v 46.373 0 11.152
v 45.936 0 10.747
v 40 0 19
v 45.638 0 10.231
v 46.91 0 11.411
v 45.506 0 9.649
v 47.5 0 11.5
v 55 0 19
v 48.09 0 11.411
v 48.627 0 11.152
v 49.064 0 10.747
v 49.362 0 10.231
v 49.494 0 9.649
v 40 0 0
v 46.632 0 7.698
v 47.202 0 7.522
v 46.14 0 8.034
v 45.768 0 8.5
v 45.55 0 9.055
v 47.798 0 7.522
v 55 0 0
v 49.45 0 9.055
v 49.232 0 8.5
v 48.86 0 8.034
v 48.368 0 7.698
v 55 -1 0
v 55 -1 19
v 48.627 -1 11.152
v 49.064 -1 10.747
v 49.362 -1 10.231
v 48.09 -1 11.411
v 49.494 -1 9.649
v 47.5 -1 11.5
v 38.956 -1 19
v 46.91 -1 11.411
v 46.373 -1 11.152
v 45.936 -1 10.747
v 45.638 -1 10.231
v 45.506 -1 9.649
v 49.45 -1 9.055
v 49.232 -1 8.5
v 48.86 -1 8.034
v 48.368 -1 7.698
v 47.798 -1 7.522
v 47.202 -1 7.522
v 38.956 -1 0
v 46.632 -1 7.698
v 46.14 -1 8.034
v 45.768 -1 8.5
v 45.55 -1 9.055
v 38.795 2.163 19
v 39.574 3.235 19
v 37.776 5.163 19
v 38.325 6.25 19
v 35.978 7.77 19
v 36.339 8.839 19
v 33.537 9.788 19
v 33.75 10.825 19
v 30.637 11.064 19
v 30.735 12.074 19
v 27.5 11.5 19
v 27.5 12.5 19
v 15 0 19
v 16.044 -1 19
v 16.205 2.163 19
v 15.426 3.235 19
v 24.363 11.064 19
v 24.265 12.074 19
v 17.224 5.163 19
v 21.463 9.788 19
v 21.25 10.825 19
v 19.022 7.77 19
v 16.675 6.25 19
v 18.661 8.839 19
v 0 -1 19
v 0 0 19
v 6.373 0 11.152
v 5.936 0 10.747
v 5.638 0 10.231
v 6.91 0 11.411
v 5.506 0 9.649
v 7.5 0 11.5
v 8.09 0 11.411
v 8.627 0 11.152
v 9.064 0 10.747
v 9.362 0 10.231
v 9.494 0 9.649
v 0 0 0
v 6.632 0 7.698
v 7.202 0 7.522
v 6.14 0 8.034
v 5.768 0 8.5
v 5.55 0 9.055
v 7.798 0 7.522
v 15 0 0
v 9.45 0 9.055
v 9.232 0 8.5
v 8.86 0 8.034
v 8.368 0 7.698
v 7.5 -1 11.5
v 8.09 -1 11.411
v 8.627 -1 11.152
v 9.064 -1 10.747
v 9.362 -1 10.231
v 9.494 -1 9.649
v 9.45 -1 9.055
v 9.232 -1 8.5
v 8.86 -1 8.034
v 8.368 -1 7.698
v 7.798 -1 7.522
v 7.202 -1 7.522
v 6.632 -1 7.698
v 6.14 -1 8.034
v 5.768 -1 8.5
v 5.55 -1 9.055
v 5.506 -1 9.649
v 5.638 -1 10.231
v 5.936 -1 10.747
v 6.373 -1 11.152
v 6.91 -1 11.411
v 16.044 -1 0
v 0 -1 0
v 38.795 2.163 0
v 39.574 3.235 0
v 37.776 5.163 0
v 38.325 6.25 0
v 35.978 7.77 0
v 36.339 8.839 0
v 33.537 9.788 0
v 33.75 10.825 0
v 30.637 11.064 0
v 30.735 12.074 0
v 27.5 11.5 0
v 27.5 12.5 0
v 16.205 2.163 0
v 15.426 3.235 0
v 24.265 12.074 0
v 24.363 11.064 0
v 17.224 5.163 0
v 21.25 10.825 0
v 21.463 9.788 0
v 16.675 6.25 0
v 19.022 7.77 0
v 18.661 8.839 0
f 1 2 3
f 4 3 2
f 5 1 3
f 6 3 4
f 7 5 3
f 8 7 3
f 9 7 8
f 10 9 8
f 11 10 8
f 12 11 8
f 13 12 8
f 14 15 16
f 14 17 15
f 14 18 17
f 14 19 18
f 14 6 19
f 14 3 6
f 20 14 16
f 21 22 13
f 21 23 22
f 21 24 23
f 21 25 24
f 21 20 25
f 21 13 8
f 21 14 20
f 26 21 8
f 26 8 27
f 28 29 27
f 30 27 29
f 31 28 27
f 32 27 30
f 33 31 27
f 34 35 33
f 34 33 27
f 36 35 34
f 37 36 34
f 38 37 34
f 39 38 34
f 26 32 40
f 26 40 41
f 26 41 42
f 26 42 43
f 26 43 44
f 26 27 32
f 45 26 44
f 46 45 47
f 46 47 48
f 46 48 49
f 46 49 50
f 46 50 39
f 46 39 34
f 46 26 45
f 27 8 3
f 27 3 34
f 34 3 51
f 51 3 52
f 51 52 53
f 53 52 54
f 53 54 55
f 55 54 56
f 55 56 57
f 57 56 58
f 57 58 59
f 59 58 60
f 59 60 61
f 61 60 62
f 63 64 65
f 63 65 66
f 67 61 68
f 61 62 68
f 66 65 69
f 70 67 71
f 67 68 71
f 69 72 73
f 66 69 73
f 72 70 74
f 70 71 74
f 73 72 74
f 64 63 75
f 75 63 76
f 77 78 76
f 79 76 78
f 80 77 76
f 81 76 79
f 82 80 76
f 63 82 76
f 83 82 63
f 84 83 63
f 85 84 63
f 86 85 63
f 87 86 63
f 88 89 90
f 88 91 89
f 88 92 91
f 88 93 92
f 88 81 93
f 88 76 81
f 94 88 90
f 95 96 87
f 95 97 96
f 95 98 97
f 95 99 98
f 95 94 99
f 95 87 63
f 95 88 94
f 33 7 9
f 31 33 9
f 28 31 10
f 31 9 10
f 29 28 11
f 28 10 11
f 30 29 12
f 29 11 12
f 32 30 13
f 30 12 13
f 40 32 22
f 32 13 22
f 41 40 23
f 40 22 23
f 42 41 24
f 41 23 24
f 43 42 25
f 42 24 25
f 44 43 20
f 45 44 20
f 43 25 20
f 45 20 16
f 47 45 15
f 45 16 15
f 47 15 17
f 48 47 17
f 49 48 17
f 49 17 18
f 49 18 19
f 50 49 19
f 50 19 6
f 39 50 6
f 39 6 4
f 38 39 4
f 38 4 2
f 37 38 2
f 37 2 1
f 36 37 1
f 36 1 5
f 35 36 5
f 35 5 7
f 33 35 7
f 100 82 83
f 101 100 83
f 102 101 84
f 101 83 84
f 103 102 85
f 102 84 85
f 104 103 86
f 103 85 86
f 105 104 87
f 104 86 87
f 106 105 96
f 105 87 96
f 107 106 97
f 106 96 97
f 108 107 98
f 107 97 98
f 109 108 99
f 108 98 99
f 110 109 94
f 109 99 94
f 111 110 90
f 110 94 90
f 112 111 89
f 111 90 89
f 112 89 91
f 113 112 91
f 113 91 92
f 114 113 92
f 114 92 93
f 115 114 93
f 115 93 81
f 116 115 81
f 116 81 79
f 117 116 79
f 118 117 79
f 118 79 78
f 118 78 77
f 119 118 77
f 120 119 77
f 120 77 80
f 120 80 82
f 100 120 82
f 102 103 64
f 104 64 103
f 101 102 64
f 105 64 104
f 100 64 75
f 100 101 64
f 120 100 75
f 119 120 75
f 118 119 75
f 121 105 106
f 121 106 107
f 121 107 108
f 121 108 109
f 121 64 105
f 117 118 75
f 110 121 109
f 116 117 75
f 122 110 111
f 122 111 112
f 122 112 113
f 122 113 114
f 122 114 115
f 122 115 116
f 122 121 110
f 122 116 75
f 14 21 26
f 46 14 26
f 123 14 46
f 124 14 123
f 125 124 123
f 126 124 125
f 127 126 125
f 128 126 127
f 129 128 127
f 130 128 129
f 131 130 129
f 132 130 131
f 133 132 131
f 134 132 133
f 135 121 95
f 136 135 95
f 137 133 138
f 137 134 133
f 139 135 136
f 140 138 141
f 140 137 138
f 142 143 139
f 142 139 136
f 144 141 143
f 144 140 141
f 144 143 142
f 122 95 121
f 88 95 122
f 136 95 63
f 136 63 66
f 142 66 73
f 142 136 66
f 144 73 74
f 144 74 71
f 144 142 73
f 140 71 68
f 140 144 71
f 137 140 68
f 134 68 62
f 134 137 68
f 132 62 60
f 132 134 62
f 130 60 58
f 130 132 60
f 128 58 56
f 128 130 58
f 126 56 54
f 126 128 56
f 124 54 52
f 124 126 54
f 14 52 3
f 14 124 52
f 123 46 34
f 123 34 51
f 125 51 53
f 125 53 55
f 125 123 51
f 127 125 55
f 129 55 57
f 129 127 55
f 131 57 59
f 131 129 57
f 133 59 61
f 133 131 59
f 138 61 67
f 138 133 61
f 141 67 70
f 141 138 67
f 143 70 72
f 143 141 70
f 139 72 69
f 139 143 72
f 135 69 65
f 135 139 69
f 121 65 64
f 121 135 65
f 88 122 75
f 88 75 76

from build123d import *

# Parameters (mm, degrees)
Y_KSEKLIK_EKSTR_ZYON1_DEPTH = 19
IZIM2_R                     = 2
KES_EKSTR_ZYON1_DEPTH       = 19


with BuildPart() as part:
    # Çizim1 → Yükseklik-Ekstrüzyon1 (new body)
    with BuildSketch(Plane.XY):
        with BuildLine():
            Line((0, 0), (15, 0))
            ThreePointArc((15, 0), (27.5, 12.5), (40, 0))
            Line((40, 0), (55, 0))
            Line((55, 0), (55, -1))
            Line((55, -1), (38.956439237, -1))
            ThreePointArc((38.956439237, -1), (27.5, 11.5), (16.043560763, -1))
            Line((16.043560763, -1), (16, -1))
            Line((16, -1), (0, -1))
            Line((0, -1), (0, 0))
        make_face()
    extrude(amount=Y_KSEKLIK_EKSTR_ZYON1_DEPTH)

    # Çizim2 → Kes-Ekstrüzyon1 (cut)
    with BuildSketch(Plane(origin=(0, 0, 0), x_dir=(1, 0, 0), z_dir=(0, 1, 0))):
        with Locations(Location((7.5, -9.5, 0), (0, 0, 270))):
            Circle(IZIM2_R)
        with Locations(Location((47.5, -9.5, 0), (0, 0, 270))):
            Circle(IZIM2_R)
    extrude(amount=-KES_EKSTR_ZYON1_DEPTH, mode=Mode.SUBTRACT)


solid = part.part
